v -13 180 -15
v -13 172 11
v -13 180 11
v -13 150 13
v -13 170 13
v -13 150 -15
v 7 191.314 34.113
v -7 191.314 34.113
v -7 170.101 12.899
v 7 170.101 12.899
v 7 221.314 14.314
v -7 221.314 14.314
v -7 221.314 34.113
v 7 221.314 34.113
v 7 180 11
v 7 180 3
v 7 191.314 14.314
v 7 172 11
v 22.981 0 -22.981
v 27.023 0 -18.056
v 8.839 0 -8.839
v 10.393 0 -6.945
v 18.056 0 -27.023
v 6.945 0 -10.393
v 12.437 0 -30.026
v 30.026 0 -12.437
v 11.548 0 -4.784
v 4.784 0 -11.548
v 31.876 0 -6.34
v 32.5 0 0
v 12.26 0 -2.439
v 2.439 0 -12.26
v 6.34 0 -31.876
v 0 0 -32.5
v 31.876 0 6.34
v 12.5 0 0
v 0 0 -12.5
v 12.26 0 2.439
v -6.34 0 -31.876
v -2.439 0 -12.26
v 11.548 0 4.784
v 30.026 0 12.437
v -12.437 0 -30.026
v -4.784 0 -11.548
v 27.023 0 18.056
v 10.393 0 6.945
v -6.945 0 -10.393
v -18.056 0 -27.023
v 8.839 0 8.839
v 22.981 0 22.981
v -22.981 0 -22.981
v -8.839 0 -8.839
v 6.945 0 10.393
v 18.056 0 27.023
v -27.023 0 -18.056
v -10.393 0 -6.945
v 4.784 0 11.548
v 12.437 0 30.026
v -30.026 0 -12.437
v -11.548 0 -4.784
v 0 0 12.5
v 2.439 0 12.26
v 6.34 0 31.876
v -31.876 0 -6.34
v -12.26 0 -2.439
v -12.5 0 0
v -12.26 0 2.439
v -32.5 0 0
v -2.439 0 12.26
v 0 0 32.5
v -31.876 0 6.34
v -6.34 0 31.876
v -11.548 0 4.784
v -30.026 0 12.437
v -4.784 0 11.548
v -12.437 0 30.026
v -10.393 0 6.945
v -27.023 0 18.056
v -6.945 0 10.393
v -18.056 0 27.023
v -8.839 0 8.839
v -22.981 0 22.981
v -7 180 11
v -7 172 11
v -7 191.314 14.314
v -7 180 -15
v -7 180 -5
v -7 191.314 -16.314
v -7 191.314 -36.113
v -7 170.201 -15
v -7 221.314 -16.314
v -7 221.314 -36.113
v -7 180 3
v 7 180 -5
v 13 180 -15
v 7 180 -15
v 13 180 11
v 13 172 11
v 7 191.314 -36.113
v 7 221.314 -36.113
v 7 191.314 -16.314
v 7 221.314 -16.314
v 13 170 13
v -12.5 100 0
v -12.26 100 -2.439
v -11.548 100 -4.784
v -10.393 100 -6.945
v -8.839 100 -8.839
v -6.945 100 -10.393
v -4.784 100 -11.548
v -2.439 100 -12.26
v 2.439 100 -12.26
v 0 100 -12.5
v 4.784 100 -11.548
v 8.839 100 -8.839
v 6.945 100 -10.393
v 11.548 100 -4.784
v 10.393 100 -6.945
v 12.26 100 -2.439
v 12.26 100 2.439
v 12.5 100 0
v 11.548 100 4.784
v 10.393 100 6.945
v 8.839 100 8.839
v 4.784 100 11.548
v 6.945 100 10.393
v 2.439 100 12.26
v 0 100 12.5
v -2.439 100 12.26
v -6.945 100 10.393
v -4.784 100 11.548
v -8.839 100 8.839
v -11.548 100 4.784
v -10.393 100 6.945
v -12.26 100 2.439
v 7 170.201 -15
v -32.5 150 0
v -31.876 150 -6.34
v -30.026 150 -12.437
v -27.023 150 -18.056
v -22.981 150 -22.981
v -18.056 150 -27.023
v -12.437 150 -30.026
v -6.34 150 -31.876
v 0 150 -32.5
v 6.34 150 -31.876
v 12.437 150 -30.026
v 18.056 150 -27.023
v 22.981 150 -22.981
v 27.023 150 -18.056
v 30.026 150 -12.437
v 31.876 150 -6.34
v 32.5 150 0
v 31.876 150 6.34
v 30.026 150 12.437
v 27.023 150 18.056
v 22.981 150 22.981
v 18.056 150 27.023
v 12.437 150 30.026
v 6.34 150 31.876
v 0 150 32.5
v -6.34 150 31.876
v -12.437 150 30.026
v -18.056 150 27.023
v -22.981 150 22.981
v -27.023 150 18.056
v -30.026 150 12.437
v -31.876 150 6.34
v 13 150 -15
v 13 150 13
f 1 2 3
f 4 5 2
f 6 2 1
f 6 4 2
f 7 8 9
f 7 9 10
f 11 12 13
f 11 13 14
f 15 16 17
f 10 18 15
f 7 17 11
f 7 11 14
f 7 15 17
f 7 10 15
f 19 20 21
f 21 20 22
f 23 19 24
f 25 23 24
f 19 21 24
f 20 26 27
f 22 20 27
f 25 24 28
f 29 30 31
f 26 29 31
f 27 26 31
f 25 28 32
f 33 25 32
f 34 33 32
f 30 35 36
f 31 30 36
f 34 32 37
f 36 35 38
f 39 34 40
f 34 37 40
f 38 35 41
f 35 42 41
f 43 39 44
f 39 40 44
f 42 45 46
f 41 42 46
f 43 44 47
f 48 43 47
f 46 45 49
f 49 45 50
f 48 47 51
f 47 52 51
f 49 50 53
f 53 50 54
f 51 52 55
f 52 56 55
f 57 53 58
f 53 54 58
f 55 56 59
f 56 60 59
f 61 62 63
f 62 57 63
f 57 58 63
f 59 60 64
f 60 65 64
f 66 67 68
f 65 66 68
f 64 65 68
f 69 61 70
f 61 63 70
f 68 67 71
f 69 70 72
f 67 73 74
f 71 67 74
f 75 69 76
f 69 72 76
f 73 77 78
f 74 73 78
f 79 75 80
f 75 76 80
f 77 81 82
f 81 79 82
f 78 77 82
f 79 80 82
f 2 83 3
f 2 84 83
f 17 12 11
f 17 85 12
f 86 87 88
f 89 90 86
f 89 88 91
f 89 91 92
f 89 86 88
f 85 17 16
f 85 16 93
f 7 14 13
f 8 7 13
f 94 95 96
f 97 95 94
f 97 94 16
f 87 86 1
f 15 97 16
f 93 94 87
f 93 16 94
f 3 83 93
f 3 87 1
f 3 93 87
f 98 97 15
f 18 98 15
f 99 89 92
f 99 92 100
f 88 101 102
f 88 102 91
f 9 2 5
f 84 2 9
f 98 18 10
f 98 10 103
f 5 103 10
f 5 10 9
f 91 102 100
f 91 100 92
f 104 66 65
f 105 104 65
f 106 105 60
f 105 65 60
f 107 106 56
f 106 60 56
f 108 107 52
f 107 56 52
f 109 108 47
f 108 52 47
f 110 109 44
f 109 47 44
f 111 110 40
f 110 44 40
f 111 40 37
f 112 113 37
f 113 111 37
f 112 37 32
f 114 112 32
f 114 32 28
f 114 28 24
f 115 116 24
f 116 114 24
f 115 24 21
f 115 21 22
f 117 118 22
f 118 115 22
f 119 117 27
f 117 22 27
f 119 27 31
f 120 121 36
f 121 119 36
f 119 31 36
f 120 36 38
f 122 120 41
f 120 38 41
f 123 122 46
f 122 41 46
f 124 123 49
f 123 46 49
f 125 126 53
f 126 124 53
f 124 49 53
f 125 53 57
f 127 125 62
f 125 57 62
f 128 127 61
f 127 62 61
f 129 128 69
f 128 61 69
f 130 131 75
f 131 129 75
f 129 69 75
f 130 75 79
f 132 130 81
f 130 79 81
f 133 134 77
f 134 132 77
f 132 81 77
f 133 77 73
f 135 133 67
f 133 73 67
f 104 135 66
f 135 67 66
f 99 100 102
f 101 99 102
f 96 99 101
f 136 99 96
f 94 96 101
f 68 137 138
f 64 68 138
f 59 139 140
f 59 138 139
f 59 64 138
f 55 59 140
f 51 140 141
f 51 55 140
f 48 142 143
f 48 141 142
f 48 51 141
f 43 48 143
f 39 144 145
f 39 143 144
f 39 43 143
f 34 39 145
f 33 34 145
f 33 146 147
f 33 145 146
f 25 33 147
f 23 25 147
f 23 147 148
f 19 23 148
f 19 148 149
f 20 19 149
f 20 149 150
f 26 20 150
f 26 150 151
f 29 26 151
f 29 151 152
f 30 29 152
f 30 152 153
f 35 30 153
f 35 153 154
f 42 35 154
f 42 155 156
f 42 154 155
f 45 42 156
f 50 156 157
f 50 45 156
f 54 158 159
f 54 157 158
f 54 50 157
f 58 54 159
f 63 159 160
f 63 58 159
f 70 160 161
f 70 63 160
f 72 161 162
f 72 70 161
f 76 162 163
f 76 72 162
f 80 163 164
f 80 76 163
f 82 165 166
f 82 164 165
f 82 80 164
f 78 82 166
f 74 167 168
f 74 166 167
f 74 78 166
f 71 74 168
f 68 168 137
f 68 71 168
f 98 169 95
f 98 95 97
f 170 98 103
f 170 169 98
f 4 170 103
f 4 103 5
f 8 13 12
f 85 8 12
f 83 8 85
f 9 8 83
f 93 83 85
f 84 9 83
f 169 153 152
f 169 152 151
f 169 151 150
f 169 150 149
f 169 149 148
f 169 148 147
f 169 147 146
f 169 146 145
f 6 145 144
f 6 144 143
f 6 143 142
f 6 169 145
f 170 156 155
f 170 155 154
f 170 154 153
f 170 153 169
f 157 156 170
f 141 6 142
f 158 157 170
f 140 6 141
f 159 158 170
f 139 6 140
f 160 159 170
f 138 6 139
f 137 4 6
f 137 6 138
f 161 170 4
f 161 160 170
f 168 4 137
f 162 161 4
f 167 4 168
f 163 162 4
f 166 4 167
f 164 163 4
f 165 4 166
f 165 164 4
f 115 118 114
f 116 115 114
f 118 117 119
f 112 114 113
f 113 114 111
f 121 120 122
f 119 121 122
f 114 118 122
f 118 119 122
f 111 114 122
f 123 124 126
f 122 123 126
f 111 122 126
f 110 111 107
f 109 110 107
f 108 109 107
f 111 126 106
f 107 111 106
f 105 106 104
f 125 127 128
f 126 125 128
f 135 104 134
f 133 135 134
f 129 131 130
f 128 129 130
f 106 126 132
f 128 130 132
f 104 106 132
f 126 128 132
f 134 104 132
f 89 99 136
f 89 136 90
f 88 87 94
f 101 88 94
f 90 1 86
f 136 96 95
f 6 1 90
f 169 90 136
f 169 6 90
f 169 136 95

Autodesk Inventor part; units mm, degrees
ref_plane "YZ Plane" through (0, 0, 0) normal (1, 0, 0) x (0, 1, 0)
ref_plane "XZ Plane" through (0, 0, 0) normal (0, 1, 0) x (-1, 0, 0)
sketch "Szkic1" plane through (0, 0, 0) normal (0, 1, 0) x (-1, 0, 0)
  circle A0 centre (0, 0) radius 12.5
  circle A1 centre (0, 0) radius 32.5
  dimension "d0" = 25
  dimension "d1" = 65
extrude "Wyciągnięcie proste1" add sketch "Szkic1" along normal blind 150 contours A0 | A1
sketch "Szkic2" plane through (0, 0, 0) normal (0, -1, 0) x (1, 0, 0)
  point P0 (0, 0)
extrude "Wyciągnięcie proste2" cut sketch "Szkic1" along normal blind 100 contours A0
sketch "Szkic3" plane through (0, 150, 0) normal (0, 1, 0) x (1, 0, 0)
  line L0 (13, -13) -> (-13, -13)
  line L1 (-13, -13) -> (-13, 13)
  line L2 (-13, 13) -> (13, 13)
  line L3 (13, 13) -> (13, -13)
  line L4 (13, -13) -> (-13, 13) construction
  line L5 (-13, -13) -> (13, 13) construction
  point P0 (0, 0)
  dimension "d6" = 26
  dimension "d7" = 26
extrude "Wyciągnięcie proste3" add sketch "Szkic3" along normal blind 30
chamfer "Faza1" distance 10 angle 45 2 edges at (0, 180, -13) (0, 180, 13)
sketch "Szkic4" plane through (-13, 180, 3) normal (0, 0.7071, 0.7071) x (1, 0, 0)
  line L0 (26, 0) -> (0, 0) projected
  line L1 (6, -14) -> (20, -14)
  line L2 (20, -14) -> (20, 0)
  line L3 (20, 0) -> (6, 0)
  line L4 (6, 0) -> (6, -14)
  line L5 (6, -14) -> (20, 0) construction
  line L6 (20, -14) -> (6, 0) construction
  line L7 (0, 0) -> (0, -14.1421) projected
  point P0 (13, -125.1579)
  point P1 (13, -7)
  dimension "d13" = 14
  dimension "d14" = 14
  dimension "d15" = 6
extrude "Wyciągnięcie proste4" add sketch "Szkic4" along normal blind 30
chamfer "Faza2" distance 14 angle 45 1 edges at (0, 201.2132, 24.2132)
sketch "Szkic5" plane through (-7, 191.3137, 34.1127) normal (0, 1, 0) x (1, 0, 0)
  line L0 (0, 31.1127) -> (0, 19.799) projected
  line L1 (14, 0) -> (0, 0)
  line L2 (0, 0) -> (0, 19.799)
  line L3 (0, 19.799) -> (14, 19.799)
  line L4 (14, 19.799) -> (14, 0)
  point P0 (7, 34.1127)
  dimension "d21" = 14
  dimension "d22" = 19.799
extrude "Wyciągnięcie proste5" add sketch "Szkic5" along normal blind 30
ref_plane "Płaszczyzna konstrukcyjna1" through (-13, 150, -1) normal (0, 0, 1) x (1, 0, 0)
mirror "Odbij1" about plane through (-13, 150, -1) normal (0, 0, 1) of "Wyciągnięcie proste5", "Wyciągnięcie proste4", "Wyciągnięcie proste3"
equation "\"PromieńGięcia\" = Grubość"
equation "\"SzerokośćGięciaPodcięcia\" = Grubość"
equation "\"GłębokośćGięciaPodcięcia\" = 0.5 * Grubość"
equation "\"RozmiarPodcięciaNarożnika\" = 4 * Grubość"
equation "\"MinimalnaPozostałość\" = 2 * Grubość"
equation "\"PromieńPrzejścia\" = PromieńGięcia"
equation "\"Rozmiar_promienia_Jacobiego\" = PromieńGięcia"
equation "\"Wielk_odstępu\" = Grubość"
equation "\"Grubość\" = 0.5"
properties part number "czesc5"
